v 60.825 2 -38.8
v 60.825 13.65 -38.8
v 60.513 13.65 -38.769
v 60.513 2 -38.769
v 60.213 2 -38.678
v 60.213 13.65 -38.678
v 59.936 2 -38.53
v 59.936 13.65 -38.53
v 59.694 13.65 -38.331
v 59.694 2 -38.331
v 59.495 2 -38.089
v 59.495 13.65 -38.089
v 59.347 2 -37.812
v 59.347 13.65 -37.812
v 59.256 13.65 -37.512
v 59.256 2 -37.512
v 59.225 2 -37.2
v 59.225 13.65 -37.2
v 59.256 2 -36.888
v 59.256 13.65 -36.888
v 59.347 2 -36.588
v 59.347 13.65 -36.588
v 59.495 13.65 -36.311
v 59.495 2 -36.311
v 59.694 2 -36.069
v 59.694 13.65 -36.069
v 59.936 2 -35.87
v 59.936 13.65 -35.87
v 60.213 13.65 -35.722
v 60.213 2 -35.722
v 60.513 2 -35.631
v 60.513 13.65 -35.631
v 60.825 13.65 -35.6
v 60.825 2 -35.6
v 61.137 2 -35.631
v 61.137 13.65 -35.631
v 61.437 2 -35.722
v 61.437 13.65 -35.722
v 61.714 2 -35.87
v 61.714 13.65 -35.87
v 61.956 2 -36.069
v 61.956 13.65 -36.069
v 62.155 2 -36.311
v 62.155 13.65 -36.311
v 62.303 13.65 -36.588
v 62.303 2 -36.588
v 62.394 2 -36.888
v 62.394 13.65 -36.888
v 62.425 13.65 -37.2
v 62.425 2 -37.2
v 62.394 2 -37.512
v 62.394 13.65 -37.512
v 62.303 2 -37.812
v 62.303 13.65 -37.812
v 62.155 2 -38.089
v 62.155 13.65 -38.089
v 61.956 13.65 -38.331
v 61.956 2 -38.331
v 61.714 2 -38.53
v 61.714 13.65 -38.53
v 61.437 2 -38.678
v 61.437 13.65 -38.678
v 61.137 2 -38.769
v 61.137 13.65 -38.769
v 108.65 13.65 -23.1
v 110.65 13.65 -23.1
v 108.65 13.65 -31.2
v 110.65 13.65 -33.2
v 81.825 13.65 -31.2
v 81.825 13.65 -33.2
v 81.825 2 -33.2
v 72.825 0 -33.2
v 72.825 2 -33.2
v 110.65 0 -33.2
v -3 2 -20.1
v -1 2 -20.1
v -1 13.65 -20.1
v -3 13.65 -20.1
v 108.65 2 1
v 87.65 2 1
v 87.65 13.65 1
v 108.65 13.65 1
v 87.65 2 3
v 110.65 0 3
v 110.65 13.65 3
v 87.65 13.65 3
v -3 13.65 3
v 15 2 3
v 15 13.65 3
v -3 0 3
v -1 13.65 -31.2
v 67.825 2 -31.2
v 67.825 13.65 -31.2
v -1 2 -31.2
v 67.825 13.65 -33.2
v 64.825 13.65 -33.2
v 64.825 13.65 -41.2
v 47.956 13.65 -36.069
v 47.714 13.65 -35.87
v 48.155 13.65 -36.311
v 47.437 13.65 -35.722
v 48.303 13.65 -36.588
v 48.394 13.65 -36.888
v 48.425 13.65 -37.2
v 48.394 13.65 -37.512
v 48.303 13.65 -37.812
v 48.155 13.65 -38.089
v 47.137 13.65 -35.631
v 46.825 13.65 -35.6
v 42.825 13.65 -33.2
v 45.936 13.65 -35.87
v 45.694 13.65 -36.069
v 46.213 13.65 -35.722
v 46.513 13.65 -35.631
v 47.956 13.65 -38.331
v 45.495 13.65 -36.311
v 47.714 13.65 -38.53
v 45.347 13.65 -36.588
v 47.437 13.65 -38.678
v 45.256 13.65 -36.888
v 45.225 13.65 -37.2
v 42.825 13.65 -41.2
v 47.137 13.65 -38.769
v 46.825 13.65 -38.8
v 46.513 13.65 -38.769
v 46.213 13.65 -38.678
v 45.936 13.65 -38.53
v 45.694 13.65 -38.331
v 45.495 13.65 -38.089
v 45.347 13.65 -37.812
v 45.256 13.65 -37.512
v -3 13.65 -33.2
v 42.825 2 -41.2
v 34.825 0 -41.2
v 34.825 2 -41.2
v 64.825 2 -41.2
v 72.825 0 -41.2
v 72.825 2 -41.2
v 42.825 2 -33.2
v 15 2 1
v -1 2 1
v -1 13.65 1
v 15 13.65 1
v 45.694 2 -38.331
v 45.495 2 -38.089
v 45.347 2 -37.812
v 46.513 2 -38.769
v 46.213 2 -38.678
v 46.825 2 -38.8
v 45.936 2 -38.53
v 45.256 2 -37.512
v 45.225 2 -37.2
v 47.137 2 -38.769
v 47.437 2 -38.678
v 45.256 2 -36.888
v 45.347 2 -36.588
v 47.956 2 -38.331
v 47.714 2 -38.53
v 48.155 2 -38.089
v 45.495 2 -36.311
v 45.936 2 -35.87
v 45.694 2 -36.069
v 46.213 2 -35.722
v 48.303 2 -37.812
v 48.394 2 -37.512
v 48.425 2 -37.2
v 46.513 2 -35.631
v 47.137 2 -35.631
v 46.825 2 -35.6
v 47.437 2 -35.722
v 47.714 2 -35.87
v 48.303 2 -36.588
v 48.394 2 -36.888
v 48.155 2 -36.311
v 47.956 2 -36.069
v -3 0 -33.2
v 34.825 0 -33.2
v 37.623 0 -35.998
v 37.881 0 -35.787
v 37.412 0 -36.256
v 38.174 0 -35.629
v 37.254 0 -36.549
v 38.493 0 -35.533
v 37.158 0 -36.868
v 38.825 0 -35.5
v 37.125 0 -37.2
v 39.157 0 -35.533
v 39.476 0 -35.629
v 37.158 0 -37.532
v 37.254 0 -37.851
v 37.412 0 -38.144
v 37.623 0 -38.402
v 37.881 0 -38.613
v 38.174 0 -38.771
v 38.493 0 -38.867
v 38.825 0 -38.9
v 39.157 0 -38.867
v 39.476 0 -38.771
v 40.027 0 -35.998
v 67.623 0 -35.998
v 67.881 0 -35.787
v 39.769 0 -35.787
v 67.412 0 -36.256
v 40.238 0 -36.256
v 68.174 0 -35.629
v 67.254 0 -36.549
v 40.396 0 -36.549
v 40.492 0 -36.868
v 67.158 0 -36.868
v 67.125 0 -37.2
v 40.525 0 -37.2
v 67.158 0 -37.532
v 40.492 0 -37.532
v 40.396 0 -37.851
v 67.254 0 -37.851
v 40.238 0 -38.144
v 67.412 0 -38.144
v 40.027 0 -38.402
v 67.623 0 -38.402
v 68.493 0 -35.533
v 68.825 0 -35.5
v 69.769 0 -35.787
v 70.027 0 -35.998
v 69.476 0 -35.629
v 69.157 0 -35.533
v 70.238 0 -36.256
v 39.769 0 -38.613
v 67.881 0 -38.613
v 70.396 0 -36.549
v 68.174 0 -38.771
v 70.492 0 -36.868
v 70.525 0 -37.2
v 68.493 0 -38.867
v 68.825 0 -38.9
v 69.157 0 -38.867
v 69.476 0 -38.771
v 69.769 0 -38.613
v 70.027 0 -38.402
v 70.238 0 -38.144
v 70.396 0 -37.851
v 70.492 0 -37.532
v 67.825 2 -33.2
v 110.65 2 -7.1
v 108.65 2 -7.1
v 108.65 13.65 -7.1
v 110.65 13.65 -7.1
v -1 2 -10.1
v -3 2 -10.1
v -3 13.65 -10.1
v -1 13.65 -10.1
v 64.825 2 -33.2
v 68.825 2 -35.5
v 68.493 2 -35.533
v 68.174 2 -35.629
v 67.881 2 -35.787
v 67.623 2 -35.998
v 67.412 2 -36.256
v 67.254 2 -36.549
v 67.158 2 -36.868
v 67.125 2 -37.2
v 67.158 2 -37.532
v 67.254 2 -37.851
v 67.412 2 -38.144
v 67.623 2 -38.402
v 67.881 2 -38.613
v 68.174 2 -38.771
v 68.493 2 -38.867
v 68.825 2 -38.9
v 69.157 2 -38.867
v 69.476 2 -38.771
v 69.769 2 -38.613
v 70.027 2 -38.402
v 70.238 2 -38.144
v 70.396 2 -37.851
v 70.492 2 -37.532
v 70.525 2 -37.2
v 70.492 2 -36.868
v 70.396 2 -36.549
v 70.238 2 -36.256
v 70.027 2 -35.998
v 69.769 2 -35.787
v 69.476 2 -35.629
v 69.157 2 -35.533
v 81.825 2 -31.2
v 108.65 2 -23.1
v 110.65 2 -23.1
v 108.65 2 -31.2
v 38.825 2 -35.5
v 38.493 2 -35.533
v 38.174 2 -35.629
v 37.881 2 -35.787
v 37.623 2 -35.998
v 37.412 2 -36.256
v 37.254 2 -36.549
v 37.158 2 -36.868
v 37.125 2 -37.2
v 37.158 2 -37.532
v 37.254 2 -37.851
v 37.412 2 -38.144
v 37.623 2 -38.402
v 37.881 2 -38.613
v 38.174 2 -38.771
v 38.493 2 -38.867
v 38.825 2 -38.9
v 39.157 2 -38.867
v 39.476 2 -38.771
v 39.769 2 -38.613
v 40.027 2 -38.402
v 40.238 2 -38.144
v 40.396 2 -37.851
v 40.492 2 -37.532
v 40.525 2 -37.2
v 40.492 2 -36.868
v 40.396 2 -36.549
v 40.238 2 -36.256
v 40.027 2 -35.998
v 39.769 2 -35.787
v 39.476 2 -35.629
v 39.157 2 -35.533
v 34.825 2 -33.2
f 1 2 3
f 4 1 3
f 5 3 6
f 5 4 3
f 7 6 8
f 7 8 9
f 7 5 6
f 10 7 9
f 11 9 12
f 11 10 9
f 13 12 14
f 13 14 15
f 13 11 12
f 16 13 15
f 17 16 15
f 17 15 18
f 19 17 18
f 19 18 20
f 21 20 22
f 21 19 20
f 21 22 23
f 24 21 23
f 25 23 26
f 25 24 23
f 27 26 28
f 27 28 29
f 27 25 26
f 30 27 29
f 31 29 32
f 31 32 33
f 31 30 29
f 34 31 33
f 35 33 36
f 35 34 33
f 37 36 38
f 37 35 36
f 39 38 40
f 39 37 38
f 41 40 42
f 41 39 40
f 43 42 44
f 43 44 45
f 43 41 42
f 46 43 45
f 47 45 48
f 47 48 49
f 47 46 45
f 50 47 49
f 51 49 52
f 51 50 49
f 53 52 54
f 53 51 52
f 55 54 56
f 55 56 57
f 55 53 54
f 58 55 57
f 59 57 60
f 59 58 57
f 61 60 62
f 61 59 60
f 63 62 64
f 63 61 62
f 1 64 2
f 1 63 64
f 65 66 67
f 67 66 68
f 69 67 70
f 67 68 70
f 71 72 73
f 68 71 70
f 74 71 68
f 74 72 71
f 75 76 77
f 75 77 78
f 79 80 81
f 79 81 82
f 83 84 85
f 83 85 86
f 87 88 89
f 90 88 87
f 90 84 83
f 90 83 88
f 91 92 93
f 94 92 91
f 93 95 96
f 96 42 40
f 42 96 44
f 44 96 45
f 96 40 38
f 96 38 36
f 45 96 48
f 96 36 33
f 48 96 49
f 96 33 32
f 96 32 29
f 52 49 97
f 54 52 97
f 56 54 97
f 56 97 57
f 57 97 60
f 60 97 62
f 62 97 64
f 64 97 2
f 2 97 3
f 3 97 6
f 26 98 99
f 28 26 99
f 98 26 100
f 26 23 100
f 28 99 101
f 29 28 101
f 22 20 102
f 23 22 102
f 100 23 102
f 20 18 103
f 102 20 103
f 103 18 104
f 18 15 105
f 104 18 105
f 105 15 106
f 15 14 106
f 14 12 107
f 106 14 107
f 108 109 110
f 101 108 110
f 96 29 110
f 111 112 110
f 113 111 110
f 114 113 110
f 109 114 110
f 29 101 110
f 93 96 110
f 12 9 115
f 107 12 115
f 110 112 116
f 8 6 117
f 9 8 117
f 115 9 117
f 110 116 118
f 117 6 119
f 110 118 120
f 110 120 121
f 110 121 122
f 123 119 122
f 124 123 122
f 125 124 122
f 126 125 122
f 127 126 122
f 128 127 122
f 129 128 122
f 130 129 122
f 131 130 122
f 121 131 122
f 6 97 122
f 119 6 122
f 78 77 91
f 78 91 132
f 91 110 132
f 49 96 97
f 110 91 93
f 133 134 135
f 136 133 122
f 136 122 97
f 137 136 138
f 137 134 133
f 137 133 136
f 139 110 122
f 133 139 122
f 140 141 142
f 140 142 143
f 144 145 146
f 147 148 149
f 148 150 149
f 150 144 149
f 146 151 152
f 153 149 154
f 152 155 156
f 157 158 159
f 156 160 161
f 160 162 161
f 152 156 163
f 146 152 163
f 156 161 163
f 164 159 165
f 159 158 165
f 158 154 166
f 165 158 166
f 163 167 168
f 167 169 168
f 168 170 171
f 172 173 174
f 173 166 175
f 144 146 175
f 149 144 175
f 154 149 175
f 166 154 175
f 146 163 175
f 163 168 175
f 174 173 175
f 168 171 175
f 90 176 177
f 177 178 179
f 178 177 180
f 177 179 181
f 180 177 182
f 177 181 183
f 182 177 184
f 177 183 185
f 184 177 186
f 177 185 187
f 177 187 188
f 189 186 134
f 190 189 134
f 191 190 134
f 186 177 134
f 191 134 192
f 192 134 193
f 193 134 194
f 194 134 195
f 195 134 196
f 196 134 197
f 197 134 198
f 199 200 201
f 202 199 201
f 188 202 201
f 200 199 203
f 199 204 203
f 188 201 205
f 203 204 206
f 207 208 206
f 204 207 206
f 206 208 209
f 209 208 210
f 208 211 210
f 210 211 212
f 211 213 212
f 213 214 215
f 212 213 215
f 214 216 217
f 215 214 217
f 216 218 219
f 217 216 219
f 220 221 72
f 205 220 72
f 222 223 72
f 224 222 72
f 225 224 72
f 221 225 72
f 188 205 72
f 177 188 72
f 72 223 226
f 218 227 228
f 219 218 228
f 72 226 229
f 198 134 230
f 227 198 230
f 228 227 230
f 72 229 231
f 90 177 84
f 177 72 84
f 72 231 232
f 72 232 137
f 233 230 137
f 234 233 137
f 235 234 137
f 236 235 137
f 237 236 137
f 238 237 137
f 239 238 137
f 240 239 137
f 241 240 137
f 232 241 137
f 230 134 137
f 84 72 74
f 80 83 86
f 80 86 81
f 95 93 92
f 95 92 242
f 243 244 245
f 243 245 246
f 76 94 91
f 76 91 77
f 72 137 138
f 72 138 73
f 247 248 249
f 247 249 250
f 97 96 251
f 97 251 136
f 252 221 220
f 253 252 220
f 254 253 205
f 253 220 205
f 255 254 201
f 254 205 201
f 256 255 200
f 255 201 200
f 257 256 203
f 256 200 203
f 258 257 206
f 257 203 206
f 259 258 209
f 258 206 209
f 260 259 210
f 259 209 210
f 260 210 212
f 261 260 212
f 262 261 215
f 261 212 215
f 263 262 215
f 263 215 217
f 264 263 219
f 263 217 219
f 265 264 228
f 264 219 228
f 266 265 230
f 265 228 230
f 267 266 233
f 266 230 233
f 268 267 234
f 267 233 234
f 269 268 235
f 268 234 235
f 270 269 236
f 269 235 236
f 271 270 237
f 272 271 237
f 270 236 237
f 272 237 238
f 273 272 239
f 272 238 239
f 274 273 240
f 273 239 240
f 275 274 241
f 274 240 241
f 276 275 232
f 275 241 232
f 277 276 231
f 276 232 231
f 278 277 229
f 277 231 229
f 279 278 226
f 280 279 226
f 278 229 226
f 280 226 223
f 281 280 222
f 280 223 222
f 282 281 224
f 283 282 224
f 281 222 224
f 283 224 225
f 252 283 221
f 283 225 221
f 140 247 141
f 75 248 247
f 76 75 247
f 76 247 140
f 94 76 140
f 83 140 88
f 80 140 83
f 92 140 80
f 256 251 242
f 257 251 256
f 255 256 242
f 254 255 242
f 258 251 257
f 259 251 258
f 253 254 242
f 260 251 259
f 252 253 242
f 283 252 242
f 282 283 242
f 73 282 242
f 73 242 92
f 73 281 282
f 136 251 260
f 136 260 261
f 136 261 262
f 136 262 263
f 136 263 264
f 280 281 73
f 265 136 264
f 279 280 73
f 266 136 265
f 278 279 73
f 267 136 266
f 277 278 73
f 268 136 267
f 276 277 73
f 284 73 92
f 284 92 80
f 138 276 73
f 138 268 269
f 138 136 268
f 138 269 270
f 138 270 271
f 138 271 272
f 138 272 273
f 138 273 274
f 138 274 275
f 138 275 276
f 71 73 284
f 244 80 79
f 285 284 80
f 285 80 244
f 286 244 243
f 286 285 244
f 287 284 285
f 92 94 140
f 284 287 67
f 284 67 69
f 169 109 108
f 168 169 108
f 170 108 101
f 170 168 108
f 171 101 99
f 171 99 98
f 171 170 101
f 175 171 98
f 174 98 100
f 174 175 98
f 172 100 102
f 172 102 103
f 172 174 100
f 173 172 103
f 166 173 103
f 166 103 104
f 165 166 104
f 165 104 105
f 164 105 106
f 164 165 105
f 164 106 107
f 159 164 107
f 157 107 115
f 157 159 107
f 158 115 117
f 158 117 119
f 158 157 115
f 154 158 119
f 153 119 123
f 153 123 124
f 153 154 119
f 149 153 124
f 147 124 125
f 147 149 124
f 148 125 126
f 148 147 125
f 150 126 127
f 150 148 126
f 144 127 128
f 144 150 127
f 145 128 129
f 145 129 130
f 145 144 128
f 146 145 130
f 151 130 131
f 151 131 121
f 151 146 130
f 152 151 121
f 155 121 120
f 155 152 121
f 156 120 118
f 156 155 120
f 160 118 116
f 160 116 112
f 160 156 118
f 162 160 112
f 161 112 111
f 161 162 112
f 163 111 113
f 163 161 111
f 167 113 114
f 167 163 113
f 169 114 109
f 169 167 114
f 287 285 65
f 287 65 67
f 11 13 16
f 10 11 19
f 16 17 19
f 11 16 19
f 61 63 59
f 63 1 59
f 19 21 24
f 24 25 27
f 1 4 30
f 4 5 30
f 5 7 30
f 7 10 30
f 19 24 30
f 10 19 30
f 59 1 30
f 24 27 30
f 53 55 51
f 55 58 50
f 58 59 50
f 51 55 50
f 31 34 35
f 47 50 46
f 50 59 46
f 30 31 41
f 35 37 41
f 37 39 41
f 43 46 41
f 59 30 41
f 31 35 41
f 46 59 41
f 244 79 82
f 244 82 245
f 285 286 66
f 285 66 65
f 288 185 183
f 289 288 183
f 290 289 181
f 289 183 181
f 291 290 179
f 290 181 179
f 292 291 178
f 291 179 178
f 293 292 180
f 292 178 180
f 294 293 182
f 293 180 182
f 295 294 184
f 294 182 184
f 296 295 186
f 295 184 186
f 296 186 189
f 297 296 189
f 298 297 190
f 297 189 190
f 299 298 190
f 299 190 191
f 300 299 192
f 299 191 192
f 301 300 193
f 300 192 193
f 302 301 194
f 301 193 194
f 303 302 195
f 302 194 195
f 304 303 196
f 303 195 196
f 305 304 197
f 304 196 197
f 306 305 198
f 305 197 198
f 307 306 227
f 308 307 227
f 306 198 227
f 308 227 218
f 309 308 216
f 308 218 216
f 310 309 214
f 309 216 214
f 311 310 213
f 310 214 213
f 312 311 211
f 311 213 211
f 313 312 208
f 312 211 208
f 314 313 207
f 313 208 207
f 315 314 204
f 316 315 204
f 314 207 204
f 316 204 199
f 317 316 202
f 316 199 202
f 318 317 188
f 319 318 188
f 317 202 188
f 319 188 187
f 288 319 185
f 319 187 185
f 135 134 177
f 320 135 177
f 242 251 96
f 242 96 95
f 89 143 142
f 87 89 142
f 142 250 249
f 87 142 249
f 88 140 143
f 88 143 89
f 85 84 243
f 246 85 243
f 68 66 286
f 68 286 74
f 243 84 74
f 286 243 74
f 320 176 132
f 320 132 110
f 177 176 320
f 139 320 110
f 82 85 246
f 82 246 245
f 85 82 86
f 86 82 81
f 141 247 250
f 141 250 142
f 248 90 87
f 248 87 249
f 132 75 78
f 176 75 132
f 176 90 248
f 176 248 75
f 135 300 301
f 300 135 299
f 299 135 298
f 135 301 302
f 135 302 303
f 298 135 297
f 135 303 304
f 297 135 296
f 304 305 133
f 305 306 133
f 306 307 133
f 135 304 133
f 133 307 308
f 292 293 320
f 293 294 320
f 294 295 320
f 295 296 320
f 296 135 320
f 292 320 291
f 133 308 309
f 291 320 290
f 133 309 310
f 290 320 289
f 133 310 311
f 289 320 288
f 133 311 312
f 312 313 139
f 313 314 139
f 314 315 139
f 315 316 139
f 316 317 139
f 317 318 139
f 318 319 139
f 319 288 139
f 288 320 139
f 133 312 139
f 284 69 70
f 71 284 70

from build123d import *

# Parameters (mm, degrees)
SKETCH1_W           = 113.65
SKETCH1_H           = 36.2
SKETCH1_W_2         = 109.65
SKETCH1_H_2         = 32.2
SKETCH1_W_3         = 107.65
SKETCH1_H_3         = 30.2
BOSS_EXTRUDE1_DEPTH = 2
BOSS_EXTRUDE2_DEPTH = 11.65
SKETCH3_W           = 38
SKETCH3_H           = 8
SKETCH3_R           = 1.7
BOSS_EXTRUDE3_DEPTH = 2
SKETCH4_W           = 22
SKETCH4_H           = 8
SKETCH4_R           = 1.6
BOSS_EXTRUDE4_DEPTH = 11.65
SKETCH5_W           = 14
SKETCH5_H           = 2
CUT_EXTRUDE1_DEPTH  = 11.65


with BuildPart() as part:
    # Sketch1 → Boss-Extrude1 (new body)
    # profile 1 of 3: a face of its own
    with BuildSketch(Plane(origin=(0, 0, 0), x_dir=(1, 0, 0), z_dir=(0, 1, 0))):
        with Locations((53.825, 15.1)):
            Rectangle(SKETCH1_W, SKETCH1_H)
        with Locations((53.825, 15.1)):
            Rectangle(SKETCH1_W_2, SKETCH1_H_2, mode=Mode.SUBTRACT)
    # profile 2 of 3: a face of its own
    with BuildSketch(Plane(origin=(0, 0, 0), x_dir=(1, 0, 0), z_dir=(0, 1, 0))):
        with Locations((53.825, 15.1)):
            Rectangle(SKETCH1_W_2, SKETCH1_H_2)
        with Locations((53.825, 15.1)):
            Rectangle(SKETCH1_W_3, SKETCH1_H_3, mode=Mode.SUBTRACT)
    # profile 3 of 3: a face of its own
    with BuildSketch(Plane(origin=(0, 0, 0), x_dir=(1, 0, 0), z_dir=(0, 1, 0))):
        with Locations((53.825, 15.1)):
            Rectangle(SKETCH1_W_3, SKETCH1_H_3)
    extrude(amount=BOSS_EXTRUDE1_DEPTH)

    # Sketch2 → Boss-Extrude2 (add)
    with BuildSketch(Plane(origin=(0, 2, 0), x_dir=(1, 0, 0), z_dir=(0, 1, 0))):
        Polygon((15, -1), (15, -3), (-3, -3), (-3, 10.1), (-1, 10.1), (-1, -1), align=None)
        Polygon((-1, 20.1), (-3, 20.1), (-3, 33.2), (110.65, 33.2), (110.65, 23.1), (108.65, 23.1), (108.65, 31.2), (-1, 31.2), align=None)
        Polygon((108.65, -1), (108.65, 7.1), (110.65, 7.1), (110.65, -3), (87.65, -3), (87.65, -1), align=None)
    extrude(amount=BOSS_EXTRUDE2_DEPTH)

    # Sketch3 → Boss-Extrude3 (add)
    with BuildSketch(Plane.XZ):
        with Locations((53.825, -37.2)):
            Rectangle(SKETCH3_W, SKETCH3_H)
        with Locations(Location((68.825, -37.2, 0), (0, 0, 90))):
            Circle(SKETCH3_R, mode=Mode.SUBTRACT)
        with Locations(Location((38.825, -37.2, 0), (0, 0, 90))):
            Circle(SKETCH3_R, mode=Mode.SUBTRACT)
    extrude(amount=-BOSS_EXTRUDE3_DEPTH)

    # Sketch4 → Boss-Extrude4 (add)
    with BuildSketch(Plane(origin=(0, 2, 0), x_dir=(1, 0, 0), z_dir=(0, 1, 0))):
        with Locations((53.825, 37.2)):
            Rectangle(SKETCH4_W, SKETCH4_H)
        with Locations(Location((46.825, 37.2, 0), (0, 0, 270))):
            Circle(SKETCH4_R, mode=Mode.SUBTRACT)
        with Locations(Location((60.825, 37.2, 0), (0, 0, 90))):
            Circle(SKETCH4_R, mode=Mode.SUBTRACT)
    extrude(amount=BOSS_EXTRUDE4_DEPTH)

    # Sketch5 → Cut-Extrude1 (cut)
    with BuildSketch(Plane(origin=(0, 13.65, 0), x_dir=(1, 0, 0), z_dir=(0, 1, 0))):
        with Locations((74.825, 32.2)):
            Rectangle(SKETCH5_W, SKETCH5_H)
    extrude(amount=-CUT_EXTRUDE1_DEPTH, mode=Mode.SUBTRACT)


solid = part.part
